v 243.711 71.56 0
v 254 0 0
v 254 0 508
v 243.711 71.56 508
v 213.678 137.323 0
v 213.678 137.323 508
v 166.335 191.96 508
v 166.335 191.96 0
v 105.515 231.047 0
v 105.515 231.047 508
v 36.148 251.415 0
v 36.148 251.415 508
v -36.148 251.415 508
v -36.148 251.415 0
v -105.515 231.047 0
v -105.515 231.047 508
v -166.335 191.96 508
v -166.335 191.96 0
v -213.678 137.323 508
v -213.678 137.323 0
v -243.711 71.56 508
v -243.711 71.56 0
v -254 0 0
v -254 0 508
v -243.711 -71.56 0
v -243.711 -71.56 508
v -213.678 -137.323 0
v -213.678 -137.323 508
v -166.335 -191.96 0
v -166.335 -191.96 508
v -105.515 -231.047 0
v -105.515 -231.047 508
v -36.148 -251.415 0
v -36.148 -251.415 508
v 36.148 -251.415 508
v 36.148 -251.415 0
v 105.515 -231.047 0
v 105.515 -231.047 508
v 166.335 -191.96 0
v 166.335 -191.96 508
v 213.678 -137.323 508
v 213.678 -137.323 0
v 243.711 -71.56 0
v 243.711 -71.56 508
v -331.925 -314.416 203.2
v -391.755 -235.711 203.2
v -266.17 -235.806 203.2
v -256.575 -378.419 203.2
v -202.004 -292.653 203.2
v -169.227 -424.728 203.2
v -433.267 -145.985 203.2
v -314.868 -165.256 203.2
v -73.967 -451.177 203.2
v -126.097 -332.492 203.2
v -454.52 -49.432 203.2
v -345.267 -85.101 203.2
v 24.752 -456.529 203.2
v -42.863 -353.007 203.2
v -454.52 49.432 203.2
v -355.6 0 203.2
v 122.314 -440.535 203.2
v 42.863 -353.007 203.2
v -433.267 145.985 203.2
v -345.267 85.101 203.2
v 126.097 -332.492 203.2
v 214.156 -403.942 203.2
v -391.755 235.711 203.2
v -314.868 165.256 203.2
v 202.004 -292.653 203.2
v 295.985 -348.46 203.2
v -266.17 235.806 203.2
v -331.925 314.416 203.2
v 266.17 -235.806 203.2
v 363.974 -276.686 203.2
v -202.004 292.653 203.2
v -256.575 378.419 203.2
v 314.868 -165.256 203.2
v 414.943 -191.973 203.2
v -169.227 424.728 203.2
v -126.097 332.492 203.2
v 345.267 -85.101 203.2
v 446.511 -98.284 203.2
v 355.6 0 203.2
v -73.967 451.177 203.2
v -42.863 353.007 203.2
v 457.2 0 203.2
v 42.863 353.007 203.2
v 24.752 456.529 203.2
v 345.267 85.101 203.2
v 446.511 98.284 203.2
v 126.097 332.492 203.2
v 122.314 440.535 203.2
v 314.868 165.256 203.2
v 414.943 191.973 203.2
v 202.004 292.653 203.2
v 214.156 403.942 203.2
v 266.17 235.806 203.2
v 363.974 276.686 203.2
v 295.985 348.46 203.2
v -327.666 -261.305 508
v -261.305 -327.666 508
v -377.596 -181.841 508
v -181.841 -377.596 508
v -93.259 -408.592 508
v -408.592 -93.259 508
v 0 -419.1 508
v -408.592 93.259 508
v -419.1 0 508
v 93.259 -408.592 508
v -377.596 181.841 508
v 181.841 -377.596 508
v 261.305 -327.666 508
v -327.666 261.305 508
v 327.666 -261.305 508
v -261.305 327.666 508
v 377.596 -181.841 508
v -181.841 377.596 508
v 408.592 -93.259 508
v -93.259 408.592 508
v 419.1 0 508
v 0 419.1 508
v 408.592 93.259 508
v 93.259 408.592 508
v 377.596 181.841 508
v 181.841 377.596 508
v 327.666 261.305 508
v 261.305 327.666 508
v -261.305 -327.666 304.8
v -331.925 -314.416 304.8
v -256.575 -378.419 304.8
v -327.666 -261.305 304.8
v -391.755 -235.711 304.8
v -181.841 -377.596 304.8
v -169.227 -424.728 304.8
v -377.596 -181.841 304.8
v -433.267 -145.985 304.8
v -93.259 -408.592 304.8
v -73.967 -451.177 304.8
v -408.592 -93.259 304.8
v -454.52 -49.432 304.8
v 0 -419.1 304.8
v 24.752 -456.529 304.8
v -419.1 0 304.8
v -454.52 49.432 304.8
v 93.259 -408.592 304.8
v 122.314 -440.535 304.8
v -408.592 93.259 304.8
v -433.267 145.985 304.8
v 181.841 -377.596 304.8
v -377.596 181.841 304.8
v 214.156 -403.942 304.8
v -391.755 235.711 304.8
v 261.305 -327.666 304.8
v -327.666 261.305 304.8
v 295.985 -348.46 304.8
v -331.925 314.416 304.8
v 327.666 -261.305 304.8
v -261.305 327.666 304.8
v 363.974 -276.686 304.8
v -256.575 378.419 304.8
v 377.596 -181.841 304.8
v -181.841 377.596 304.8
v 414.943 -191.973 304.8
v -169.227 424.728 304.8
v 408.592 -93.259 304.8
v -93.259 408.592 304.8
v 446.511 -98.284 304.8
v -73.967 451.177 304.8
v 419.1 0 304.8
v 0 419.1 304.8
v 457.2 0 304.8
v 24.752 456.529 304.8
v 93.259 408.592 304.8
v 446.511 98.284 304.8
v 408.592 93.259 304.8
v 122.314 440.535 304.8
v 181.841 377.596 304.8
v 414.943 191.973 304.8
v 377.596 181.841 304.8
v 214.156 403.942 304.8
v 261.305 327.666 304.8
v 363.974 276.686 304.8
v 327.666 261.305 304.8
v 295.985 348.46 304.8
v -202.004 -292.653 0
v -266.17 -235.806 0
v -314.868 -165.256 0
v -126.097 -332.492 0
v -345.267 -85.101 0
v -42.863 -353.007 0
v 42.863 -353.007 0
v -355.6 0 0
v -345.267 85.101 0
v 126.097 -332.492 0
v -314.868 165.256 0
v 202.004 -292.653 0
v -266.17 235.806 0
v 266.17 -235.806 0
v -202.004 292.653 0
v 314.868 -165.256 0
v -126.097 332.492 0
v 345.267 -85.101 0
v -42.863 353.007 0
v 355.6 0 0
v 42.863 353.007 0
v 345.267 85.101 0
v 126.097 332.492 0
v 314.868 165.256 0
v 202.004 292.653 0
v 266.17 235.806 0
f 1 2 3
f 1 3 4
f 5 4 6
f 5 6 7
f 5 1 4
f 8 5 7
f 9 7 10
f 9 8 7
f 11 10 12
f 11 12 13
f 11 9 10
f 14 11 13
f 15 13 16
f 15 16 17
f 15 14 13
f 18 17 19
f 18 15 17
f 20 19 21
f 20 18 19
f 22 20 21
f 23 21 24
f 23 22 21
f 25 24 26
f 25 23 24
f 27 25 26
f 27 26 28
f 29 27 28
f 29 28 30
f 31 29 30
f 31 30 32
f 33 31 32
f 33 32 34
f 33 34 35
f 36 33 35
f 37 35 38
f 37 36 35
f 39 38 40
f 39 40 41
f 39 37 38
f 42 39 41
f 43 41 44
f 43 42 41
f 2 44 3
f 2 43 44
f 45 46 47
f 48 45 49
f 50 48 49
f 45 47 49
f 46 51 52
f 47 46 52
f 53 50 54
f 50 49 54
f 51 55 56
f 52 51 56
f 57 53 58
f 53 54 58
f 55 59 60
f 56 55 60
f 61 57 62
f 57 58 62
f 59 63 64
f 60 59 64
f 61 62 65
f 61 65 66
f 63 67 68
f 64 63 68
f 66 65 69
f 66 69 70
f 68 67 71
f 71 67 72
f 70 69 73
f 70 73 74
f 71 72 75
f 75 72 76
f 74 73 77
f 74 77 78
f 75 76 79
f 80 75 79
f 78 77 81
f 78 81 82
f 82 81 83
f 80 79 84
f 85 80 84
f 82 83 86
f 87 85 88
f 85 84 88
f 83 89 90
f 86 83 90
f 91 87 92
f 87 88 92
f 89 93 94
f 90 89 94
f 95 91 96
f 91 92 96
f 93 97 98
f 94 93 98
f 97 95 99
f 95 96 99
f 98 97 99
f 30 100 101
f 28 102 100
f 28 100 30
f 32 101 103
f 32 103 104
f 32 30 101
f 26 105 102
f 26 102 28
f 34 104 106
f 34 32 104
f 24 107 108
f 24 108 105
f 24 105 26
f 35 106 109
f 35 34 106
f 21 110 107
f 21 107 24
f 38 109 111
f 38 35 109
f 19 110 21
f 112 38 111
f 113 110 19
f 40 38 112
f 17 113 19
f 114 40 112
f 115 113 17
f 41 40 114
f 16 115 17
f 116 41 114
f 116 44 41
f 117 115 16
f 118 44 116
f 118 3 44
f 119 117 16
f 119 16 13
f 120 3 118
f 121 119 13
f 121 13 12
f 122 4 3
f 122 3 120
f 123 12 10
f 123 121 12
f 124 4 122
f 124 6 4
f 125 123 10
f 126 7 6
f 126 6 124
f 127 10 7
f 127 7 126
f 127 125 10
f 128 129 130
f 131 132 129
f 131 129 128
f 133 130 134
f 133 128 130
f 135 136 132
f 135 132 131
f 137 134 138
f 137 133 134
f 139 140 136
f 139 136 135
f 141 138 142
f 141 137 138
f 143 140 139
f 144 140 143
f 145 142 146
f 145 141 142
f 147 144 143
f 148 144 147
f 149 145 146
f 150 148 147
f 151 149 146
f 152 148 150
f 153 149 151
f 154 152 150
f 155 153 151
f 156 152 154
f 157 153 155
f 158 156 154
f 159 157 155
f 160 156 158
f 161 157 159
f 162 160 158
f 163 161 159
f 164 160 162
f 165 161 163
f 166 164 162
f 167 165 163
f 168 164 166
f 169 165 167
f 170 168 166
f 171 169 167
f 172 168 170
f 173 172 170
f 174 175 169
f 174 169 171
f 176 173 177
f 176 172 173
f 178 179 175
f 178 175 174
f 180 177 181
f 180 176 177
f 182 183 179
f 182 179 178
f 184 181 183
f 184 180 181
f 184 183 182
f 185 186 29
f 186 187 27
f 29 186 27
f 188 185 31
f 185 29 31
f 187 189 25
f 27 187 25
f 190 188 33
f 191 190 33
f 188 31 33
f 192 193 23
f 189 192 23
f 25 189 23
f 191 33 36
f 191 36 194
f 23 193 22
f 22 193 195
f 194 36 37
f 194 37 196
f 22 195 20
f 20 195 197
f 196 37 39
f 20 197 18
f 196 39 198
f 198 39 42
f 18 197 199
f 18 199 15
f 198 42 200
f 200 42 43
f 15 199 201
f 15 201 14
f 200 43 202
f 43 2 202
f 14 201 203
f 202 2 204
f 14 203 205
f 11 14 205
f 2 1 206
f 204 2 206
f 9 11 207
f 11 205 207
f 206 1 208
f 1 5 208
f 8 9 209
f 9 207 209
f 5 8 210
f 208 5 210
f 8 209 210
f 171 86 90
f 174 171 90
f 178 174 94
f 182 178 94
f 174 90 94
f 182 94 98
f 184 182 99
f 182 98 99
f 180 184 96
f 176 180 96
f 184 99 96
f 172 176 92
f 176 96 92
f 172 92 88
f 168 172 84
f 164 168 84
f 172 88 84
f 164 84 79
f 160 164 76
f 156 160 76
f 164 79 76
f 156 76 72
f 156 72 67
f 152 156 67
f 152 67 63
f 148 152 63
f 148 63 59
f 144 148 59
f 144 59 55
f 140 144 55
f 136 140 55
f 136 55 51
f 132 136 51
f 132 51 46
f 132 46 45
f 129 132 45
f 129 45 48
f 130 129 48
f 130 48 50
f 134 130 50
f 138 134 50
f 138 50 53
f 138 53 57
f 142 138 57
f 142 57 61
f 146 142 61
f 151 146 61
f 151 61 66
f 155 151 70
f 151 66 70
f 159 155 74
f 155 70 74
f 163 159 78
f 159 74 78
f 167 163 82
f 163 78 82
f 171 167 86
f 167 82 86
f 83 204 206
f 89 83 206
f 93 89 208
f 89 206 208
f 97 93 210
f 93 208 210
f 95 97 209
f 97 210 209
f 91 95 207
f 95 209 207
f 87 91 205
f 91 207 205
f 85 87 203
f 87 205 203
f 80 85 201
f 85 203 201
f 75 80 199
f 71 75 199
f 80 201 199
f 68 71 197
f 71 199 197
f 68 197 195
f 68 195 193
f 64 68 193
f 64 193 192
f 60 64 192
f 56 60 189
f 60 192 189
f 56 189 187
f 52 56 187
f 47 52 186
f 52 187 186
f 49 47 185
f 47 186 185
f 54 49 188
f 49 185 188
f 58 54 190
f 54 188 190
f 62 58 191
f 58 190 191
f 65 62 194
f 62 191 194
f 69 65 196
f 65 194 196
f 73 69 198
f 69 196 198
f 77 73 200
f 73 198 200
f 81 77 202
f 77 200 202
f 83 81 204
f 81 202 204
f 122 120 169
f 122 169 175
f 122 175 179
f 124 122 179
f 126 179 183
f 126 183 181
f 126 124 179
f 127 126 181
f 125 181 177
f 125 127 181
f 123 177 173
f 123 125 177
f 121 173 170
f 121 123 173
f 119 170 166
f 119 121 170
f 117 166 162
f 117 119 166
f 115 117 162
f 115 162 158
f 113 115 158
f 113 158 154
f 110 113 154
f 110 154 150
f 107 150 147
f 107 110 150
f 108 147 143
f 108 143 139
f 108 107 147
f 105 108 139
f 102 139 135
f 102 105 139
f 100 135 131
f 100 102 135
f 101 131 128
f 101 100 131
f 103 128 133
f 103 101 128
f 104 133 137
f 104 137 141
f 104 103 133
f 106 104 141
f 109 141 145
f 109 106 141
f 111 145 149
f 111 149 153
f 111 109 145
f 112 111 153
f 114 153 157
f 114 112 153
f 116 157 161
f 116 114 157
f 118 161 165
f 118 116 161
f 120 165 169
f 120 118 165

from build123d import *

# Parameters (mm, degrees)
F0_R     = 457.2
F0_R_2   = 254
F1_DEPTH = 508
F2_R     = 457.2
F2_R_2   = 419.1
F3_DEPTH = 203.2
F4_R     = 457.2
F4_R_2   = 355.6
F5_DEPTH = 203.2


with BuildPart() as f1:
    # F0 (on Top) → F1 (new body)
    with BuildSketch(Plane.XY):
        Circle(F0_R)
        Circle(F0_R_2, mode=Mode.SUBTRACT)
    extrude(amount=F1_DEPTH)

    # F2 (on face) → F3 (cut)
    with BuildSketch(Plane.XY.offset(508)):
        Circle(F2_R)
        Circle(F2_R_2, mode=Mode.SUBTRACT)
    extrude(amount=-F3_DEPTH, mode=Mode.SUBTRACT)

    # F4 (on face) → F5 (cut)
    with BuildSketch(Plane.XY):
        Circle(F4_R)
        Circle(F4_R_2, mode=Mode.SUBTRACT)
    extrude(amount=F5_DEPTH, mode=Mode.SUBTRACT)


solid = f1.part
